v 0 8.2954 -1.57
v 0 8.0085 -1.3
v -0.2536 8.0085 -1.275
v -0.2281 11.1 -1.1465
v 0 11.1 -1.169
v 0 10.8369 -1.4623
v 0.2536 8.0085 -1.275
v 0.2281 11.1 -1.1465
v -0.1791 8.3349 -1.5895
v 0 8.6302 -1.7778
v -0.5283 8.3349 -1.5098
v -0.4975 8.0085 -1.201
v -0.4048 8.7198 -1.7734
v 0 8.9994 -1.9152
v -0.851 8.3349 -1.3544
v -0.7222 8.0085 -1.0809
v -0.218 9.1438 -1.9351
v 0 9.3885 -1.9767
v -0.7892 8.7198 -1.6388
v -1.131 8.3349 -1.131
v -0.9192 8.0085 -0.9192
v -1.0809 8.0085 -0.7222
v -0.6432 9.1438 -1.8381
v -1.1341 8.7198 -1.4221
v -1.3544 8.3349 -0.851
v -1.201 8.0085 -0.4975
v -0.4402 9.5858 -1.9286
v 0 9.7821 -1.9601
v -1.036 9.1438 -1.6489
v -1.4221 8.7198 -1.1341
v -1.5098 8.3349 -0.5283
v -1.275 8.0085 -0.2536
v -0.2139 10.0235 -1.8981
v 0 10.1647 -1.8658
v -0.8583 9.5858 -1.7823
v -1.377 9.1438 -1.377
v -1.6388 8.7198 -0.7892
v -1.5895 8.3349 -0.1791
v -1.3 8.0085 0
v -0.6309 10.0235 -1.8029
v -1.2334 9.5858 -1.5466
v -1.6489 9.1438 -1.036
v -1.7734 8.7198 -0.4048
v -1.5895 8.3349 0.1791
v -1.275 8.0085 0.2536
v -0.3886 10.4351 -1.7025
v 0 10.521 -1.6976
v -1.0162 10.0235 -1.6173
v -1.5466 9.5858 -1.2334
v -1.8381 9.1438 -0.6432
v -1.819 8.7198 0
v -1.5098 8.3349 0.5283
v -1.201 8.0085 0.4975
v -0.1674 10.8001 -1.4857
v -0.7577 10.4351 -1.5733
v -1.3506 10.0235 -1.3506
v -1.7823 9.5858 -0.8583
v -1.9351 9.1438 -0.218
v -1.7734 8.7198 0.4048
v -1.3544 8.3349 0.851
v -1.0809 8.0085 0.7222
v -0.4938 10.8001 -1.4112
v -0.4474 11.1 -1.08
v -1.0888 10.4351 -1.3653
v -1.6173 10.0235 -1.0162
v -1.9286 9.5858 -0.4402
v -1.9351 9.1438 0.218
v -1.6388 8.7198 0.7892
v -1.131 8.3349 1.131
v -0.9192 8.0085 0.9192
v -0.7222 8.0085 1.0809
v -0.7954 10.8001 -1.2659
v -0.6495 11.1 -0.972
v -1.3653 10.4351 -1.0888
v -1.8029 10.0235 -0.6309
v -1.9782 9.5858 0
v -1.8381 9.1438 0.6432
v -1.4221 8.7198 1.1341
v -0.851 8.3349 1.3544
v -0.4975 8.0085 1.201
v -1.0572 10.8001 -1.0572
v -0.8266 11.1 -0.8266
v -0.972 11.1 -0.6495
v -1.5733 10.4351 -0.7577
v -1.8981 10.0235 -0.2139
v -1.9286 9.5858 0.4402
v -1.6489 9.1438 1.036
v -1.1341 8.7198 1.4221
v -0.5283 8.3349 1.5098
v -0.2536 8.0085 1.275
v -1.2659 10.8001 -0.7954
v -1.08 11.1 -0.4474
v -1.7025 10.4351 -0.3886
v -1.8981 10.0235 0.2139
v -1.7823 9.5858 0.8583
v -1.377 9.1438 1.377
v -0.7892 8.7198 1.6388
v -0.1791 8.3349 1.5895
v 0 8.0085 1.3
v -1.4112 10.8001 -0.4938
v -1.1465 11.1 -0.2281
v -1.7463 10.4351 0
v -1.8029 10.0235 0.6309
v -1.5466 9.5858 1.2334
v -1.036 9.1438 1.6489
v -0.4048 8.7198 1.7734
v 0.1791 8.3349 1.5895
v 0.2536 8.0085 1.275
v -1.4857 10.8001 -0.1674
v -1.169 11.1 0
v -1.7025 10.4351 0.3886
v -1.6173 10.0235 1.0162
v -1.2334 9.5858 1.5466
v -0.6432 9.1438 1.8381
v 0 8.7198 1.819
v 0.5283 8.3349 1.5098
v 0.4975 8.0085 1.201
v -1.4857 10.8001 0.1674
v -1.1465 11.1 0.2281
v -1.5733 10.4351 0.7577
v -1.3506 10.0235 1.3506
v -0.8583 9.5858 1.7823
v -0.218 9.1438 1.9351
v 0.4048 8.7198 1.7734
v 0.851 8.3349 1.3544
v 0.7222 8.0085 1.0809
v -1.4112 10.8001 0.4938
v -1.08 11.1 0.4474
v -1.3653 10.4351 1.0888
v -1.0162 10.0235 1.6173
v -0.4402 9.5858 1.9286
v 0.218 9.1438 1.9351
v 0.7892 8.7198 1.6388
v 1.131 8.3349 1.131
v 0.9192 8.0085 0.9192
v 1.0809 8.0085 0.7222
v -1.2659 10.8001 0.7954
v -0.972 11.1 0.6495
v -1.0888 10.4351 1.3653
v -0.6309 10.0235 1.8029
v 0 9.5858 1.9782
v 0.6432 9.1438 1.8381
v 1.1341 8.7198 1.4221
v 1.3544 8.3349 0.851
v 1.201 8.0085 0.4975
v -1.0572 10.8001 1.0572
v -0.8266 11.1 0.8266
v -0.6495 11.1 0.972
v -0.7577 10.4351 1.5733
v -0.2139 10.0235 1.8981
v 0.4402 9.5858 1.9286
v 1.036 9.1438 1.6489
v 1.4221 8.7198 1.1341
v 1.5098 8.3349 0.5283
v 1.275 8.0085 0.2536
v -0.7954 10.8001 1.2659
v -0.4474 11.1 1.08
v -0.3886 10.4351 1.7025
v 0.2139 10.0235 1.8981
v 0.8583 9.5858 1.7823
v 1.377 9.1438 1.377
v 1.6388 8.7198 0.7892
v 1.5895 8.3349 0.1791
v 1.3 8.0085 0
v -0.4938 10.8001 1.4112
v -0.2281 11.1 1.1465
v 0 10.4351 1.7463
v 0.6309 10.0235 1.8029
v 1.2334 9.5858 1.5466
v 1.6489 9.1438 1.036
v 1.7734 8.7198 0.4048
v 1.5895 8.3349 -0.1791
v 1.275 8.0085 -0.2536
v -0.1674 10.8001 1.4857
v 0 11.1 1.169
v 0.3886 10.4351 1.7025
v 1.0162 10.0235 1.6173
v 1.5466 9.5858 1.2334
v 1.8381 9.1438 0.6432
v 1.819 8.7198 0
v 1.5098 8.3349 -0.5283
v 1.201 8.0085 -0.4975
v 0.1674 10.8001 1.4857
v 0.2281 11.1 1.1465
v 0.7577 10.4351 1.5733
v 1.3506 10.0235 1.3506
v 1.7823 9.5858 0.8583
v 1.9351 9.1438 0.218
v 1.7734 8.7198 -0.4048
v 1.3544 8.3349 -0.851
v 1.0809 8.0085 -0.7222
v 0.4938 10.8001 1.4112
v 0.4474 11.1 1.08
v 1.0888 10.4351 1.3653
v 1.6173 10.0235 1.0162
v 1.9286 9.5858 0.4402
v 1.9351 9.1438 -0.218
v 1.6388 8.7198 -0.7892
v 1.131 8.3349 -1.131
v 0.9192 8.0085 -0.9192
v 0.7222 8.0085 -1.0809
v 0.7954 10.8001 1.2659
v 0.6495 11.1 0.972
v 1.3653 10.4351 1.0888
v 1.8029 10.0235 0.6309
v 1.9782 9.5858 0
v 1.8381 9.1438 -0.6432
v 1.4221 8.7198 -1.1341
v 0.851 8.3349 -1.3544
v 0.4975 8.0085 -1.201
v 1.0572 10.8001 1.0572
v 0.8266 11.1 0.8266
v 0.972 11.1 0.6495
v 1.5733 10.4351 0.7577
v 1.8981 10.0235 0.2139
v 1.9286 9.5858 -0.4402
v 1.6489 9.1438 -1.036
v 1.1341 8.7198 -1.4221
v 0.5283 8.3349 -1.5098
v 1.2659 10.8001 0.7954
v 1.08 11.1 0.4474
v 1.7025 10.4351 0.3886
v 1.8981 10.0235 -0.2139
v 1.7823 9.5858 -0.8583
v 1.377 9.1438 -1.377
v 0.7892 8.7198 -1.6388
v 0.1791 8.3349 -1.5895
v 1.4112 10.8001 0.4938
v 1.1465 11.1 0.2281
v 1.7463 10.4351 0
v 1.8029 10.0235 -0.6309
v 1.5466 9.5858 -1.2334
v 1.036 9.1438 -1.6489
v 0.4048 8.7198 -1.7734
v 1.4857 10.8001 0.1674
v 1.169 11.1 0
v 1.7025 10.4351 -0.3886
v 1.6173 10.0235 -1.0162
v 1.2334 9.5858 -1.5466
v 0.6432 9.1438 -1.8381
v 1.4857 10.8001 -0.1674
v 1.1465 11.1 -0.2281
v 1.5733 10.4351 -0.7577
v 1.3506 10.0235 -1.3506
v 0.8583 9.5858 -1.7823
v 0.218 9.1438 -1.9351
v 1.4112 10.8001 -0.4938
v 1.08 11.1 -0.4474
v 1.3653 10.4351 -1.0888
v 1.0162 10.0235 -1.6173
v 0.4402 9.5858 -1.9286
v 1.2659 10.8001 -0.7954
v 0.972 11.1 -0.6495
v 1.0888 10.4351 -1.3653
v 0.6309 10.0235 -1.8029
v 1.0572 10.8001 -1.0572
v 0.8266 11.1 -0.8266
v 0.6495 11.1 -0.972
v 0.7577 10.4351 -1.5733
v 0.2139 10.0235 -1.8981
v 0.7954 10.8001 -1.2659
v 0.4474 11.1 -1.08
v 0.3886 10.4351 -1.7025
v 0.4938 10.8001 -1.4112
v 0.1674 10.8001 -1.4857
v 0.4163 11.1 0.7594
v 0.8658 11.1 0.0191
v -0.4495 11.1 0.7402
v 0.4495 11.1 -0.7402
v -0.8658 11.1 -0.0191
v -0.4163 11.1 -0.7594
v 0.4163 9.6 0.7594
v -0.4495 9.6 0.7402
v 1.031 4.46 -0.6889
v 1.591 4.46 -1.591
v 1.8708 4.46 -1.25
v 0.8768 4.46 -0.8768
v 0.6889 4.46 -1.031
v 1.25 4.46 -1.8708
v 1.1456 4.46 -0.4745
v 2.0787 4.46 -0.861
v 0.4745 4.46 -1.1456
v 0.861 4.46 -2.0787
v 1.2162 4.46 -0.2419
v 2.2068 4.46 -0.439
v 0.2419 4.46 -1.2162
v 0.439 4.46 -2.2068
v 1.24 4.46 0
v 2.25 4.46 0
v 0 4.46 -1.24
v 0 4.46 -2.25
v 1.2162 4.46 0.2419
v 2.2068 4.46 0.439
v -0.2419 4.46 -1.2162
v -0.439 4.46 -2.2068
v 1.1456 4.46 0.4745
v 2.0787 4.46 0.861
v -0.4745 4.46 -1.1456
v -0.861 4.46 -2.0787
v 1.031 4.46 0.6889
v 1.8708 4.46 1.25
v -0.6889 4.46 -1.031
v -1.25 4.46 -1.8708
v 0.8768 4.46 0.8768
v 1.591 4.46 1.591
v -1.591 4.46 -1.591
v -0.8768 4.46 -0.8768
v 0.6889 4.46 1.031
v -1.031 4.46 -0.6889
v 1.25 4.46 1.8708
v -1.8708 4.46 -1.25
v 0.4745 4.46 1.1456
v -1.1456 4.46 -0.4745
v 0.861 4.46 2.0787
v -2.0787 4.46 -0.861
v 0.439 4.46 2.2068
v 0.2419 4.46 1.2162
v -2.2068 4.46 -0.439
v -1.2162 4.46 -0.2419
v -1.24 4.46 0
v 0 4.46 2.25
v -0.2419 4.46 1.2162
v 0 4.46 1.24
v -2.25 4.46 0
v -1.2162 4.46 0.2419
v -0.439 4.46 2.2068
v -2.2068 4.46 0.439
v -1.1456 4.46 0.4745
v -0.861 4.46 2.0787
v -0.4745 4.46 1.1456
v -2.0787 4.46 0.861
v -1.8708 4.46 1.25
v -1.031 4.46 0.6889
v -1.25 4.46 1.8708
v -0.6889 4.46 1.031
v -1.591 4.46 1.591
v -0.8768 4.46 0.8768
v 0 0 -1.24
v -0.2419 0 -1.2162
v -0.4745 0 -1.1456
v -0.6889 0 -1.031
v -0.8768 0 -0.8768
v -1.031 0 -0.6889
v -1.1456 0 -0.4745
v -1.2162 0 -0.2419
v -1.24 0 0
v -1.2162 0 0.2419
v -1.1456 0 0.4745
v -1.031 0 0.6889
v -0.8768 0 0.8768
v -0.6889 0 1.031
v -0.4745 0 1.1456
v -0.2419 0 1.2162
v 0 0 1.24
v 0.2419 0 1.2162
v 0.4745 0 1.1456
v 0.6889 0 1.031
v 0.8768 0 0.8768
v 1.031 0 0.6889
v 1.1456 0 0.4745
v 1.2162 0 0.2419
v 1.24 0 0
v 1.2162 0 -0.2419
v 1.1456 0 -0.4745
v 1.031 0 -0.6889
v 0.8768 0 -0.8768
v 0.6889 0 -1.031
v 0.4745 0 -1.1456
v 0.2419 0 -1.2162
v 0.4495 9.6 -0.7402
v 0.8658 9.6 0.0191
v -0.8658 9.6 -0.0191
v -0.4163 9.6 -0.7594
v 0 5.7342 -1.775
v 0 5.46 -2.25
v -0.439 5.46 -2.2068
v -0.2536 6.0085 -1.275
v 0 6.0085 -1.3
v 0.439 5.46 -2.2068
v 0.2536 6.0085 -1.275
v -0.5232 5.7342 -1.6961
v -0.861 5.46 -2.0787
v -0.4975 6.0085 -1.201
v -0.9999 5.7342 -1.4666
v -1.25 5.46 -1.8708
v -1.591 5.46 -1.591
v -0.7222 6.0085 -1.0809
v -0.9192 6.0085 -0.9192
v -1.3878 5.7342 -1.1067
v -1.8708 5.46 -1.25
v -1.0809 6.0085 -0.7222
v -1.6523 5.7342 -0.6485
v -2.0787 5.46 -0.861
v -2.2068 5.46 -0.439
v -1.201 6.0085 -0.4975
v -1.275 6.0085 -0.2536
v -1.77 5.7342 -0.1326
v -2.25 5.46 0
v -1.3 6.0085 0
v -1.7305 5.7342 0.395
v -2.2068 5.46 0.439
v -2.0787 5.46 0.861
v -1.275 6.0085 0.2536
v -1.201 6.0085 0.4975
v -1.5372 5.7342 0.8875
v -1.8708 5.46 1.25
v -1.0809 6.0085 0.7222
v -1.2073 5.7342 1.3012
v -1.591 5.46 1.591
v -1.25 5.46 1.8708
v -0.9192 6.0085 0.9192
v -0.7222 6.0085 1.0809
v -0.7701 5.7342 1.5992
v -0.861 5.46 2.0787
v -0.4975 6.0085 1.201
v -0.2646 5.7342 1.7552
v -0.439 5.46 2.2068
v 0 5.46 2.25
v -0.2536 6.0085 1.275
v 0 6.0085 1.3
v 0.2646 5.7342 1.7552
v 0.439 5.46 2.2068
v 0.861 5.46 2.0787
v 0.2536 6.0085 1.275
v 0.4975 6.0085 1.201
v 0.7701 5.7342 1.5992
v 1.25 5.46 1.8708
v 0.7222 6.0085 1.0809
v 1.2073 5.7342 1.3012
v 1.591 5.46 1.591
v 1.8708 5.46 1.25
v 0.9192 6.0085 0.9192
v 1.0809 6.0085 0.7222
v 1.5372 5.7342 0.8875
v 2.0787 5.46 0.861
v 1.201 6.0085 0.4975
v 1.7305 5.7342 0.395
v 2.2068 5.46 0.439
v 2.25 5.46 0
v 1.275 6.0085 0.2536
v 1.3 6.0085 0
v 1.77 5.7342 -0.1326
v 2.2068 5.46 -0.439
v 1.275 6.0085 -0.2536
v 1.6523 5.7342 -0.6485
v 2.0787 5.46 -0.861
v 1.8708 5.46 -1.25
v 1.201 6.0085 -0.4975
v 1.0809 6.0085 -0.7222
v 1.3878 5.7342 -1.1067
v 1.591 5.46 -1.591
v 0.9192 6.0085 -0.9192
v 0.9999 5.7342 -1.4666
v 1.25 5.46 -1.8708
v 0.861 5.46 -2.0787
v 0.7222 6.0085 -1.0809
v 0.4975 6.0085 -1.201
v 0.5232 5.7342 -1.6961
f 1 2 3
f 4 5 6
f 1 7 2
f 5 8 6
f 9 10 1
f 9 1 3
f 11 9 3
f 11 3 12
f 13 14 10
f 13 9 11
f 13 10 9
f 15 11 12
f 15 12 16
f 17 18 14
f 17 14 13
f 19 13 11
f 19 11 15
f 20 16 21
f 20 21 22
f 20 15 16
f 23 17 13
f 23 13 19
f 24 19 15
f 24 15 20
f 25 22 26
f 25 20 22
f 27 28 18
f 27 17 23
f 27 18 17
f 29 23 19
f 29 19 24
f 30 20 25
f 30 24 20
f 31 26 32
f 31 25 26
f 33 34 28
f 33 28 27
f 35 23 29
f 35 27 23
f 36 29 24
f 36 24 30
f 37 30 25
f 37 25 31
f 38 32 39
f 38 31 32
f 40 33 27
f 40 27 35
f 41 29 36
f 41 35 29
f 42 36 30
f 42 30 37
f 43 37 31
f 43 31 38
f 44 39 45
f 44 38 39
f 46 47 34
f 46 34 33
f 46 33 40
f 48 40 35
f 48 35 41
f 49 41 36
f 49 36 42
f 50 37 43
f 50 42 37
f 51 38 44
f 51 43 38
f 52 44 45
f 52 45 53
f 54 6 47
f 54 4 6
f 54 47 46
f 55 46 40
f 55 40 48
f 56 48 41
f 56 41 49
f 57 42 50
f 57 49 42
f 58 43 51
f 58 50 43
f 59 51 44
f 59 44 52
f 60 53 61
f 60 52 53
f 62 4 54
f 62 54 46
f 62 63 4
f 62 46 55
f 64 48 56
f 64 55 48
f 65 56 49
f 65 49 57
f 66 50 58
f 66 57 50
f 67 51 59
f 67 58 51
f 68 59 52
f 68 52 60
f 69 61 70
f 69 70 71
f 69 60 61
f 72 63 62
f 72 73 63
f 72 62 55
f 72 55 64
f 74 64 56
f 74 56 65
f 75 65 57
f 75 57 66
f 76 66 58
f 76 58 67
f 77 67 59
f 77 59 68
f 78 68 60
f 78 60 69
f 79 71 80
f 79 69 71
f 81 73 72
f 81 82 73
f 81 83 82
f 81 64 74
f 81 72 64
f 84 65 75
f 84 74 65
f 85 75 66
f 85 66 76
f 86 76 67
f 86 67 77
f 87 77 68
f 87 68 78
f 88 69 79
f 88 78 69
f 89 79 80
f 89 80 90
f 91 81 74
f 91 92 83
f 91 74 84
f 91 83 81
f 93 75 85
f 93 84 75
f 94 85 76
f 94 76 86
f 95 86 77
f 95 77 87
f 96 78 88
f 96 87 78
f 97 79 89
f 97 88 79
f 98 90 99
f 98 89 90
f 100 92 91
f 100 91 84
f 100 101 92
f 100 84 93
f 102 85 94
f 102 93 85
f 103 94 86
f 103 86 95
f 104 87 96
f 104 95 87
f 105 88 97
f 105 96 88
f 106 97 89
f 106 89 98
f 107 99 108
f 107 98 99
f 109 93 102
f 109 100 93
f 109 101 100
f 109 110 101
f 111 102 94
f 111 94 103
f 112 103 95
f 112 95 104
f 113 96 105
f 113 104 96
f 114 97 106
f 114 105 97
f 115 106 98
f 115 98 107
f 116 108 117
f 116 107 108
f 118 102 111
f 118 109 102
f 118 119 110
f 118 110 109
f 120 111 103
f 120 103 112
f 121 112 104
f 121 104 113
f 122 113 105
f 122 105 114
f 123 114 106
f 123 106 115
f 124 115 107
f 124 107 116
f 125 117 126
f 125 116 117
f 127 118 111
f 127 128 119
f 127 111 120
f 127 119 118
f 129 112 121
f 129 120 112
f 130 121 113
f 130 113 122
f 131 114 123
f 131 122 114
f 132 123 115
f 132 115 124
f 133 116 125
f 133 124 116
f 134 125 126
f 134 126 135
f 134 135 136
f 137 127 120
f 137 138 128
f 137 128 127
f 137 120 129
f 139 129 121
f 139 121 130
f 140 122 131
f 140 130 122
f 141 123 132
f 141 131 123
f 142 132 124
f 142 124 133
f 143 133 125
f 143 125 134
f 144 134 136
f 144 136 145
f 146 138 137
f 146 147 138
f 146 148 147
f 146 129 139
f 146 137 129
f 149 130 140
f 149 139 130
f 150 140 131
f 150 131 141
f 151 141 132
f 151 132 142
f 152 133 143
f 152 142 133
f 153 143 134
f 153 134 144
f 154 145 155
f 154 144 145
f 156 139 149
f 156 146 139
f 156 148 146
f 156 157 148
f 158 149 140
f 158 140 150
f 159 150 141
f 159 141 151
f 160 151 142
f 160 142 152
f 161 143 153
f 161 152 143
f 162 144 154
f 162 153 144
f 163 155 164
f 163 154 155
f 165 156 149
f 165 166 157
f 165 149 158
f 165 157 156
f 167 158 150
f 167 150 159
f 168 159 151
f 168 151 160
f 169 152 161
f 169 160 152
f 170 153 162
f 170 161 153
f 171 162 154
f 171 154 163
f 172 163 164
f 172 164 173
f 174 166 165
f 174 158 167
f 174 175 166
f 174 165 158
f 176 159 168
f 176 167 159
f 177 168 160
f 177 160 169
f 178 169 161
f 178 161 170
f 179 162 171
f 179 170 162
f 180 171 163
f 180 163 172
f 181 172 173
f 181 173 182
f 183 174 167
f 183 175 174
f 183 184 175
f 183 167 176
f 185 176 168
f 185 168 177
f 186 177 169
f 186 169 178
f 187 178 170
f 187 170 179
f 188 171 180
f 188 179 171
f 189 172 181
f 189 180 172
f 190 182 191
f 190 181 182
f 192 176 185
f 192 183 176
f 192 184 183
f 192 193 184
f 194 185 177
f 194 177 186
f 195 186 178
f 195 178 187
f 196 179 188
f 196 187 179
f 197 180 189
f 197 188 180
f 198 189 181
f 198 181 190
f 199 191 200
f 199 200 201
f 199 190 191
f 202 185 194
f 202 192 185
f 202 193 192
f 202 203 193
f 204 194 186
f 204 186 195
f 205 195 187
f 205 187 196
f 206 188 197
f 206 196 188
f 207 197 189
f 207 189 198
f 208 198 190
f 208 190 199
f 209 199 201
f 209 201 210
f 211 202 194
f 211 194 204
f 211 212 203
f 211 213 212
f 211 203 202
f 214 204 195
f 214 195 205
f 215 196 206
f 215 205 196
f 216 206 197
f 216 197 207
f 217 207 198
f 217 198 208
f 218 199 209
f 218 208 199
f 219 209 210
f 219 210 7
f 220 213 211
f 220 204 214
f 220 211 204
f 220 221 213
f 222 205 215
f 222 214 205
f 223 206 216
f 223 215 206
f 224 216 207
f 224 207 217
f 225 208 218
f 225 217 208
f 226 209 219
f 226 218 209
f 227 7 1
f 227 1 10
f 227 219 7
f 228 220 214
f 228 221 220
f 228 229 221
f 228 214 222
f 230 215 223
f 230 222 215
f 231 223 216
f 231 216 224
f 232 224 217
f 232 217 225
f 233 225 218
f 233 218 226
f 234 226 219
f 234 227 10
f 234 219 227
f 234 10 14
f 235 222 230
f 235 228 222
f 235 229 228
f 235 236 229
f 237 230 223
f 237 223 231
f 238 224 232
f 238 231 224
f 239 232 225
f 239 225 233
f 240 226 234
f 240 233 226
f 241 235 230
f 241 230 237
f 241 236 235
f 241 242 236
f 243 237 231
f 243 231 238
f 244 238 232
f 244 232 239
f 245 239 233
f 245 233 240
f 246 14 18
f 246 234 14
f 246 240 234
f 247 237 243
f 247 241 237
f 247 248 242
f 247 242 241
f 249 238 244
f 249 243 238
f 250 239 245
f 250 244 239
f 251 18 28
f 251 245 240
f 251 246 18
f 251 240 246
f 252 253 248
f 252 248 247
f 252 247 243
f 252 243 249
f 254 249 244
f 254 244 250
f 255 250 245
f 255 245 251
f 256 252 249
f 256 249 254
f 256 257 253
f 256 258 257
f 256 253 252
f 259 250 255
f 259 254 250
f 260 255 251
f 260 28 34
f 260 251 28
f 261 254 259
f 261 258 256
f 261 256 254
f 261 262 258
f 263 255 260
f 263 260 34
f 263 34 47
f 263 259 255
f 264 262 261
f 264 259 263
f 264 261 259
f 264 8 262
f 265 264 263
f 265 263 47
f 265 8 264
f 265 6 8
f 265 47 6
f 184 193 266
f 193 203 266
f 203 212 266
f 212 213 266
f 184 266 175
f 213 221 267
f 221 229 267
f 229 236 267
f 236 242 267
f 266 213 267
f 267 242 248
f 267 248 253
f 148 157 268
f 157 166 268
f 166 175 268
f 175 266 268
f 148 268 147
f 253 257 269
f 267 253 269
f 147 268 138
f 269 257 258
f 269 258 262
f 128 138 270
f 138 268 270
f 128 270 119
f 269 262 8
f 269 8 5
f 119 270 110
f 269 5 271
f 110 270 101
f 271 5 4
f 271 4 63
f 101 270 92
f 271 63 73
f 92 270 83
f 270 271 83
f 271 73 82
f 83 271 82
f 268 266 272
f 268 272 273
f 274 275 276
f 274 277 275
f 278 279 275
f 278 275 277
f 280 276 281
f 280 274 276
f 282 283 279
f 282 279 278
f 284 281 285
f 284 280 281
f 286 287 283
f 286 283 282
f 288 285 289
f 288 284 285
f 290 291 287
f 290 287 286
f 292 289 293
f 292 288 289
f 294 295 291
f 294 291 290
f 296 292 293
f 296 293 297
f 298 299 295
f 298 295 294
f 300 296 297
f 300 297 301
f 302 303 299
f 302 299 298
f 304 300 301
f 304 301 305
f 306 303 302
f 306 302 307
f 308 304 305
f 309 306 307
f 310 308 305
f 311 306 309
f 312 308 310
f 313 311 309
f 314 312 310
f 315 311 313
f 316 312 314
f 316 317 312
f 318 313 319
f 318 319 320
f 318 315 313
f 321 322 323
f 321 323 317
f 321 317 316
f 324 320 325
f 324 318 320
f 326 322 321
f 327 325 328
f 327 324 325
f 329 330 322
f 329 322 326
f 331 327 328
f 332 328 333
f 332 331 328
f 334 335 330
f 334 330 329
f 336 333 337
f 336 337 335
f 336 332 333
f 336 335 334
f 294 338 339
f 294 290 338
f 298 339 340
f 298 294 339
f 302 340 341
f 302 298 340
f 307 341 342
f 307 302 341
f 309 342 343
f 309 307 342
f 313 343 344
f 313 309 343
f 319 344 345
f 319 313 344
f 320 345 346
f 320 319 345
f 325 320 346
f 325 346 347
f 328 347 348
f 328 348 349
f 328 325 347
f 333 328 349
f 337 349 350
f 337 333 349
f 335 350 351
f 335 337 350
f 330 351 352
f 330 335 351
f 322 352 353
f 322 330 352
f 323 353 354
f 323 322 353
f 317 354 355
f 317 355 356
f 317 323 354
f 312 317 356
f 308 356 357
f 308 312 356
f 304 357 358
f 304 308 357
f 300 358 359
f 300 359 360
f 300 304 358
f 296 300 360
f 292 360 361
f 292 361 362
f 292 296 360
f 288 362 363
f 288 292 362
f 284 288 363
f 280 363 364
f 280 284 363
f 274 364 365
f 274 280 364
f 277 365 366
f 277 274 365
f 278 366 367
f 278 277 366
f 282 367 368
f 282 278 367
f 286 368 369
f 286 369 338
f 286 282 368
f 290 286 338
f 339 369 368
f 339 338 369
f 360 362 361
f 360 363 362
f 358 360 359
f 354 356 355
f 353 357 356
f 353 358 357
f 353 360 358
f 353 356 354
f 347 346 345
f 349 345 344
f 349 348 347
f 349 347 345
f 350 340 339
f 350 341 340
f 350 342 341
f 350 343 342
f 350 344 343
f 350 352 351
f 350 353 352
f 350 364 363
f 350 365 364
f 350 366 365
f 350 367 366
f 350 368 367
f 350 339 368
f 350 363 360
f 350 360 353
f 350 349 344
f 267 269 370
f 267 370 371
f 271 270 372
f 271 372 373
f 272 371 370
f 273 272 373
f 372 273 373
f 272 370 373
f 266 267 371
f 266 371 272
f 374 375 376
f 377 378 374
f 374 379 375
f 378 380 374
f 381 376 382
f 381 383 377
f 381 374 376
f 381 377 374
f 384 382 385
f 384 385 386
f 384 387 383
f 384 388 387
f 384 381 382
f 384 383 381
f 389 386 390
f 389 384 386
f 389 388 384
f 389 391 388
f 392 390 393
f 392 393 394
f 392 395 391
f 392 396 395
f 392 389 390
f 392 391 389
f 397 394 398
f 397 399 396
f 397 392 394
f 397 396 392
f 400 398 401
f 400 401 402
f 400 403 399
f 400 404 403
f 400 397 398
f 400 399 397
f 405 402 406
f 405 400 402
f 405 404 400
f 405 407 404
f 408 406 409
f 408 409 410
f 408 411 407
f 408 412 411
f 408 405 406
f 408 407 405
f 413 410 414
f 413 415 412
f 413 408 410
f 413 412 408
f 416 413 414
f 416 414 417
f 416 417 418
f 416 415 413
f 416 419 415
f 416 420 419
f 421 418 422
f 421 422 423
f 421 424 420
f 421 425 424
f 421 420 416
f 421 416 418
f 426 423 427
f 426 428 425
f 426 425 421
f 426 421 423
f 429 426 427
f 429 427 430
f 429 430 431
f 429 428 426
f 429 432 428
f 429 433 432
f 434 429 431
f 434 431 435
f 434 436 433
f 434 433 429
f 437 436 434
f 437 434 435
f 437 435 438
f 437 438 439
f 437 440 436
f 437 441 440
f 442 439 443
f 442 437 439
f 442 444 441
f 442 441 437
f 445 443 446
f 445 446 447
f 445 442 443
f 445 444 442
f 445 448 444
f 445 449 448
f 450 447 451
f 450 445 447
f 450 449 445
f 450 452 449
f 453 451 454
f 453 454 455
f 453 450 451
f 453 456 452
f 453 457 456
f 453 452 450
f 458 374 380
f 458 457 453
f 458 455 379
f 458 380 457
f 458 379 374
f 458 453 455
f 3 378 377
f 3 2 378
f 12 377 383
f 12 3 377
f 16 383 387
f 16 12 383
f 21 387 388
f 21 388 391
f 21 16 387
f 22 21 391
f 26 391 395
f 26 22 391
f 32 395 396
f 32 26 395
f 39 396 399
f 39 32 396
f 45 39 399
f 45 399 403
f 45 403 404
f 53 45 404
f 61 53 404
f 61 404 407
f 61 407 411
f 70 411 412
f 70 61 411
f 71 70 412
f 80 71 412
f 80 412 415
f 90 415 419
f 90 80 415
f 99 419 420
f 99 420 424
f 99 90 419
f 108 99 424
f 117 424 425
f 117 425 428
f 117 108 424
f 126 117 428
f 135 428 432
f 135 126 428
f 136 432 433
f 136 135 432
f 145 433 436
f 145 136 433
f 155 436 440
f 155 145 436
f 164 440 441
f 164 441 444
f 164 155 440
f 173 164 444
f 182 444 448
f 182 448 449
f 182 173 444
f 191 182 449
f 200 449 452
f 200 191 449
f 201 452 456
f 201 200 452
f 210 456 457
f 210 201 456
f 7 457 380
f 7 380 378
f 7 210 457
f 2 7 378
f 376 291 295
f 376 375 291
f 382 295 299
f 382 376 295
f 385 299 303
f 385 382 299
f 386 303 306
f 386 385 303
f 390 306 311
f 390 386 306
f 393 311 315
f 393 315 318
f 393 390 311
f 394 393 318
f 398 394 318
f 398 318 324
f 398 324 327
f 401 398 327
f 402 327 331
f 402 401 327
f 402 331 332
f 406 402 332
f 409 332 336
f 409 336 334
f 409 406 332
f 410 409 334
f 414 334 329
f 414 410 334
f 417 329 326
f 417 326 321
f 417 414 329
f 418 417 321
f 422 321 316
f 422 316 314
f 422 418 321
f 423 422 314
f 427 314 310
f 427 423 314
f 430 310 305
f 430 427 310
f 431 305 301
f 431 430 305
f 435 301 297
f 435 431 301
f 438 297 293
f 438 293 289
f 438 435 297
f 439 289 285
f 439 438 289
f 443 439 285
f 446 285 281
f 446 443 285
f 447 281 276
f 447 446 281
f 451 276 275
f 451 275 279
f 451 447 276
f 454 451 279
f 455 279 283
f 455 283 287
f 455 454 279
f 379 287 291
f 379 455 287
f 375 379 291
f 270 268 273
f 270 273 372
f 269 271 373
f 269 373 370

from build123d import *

# Parameters (mm, degrees)
TAGLIO_ESTRUSIONE1_DEPTH = 1.5


with BuildPart() as part:
    # Schizzo1 → Rivoluzione1 (revolve)
    with BuildSketch(Plane.XY, mode=Mode.PRIVATE) as rivoluzione1_sk:
        with BuildLine():
            Line((0, 0), (1.24, 0))
            Line((1.24, 0), (1.24, 4.46))
            Line((1.24, 4.46), (2.25, 4.46))
            Line((2.25, 4.46), (2.25, 5.46))
            Line((2.25, 5.46), (1.3, 6.008482756))
            Line((1.3, 6.008482756), (1.3, 8.008482756))
            ThreePointArc((1.3, 8.008482756), (1.854378023, 10.195968379), (0, 11.481935132))
            Line((0, 11.481935132), (0, 0))
        make_face()
    revolve(rivoluzione1_sk.sketch.rotate(Axis((0, 0, 0), (0, 1, 0)), 90), axis=Axis((0, 0, 0), (0, 1, 0)))

    # TaglioSuperficie1
    split(bisect_by=Plane(origin=(0, 11.1, 0), x_dir=(-1, 0, 0), z_dir=(0, -1, 0)), keep=Keep.TOP)

    # Schizzo2 → Taglio-Estrusione1 (cut)
    with BuildSketch(Plane(origin=(0, 11.1, 0), x_dir=(-1, 0, 0), z_dir=(0, -1, 0))):
        Polygon((-0.416334141, -0.759385201), (0.449479805, -0.740248543), (0.865813946, 0.019136658), (0.416334141, 0.759385201), (-0.449479805, 0.740248543), (-0.865813946, -0.019136658), align=None)
    extrude(amount=TAGLIO_ESTRUSIONE1_DEPTH, mode=Mode.SUBTRACT)


solid = part.part
